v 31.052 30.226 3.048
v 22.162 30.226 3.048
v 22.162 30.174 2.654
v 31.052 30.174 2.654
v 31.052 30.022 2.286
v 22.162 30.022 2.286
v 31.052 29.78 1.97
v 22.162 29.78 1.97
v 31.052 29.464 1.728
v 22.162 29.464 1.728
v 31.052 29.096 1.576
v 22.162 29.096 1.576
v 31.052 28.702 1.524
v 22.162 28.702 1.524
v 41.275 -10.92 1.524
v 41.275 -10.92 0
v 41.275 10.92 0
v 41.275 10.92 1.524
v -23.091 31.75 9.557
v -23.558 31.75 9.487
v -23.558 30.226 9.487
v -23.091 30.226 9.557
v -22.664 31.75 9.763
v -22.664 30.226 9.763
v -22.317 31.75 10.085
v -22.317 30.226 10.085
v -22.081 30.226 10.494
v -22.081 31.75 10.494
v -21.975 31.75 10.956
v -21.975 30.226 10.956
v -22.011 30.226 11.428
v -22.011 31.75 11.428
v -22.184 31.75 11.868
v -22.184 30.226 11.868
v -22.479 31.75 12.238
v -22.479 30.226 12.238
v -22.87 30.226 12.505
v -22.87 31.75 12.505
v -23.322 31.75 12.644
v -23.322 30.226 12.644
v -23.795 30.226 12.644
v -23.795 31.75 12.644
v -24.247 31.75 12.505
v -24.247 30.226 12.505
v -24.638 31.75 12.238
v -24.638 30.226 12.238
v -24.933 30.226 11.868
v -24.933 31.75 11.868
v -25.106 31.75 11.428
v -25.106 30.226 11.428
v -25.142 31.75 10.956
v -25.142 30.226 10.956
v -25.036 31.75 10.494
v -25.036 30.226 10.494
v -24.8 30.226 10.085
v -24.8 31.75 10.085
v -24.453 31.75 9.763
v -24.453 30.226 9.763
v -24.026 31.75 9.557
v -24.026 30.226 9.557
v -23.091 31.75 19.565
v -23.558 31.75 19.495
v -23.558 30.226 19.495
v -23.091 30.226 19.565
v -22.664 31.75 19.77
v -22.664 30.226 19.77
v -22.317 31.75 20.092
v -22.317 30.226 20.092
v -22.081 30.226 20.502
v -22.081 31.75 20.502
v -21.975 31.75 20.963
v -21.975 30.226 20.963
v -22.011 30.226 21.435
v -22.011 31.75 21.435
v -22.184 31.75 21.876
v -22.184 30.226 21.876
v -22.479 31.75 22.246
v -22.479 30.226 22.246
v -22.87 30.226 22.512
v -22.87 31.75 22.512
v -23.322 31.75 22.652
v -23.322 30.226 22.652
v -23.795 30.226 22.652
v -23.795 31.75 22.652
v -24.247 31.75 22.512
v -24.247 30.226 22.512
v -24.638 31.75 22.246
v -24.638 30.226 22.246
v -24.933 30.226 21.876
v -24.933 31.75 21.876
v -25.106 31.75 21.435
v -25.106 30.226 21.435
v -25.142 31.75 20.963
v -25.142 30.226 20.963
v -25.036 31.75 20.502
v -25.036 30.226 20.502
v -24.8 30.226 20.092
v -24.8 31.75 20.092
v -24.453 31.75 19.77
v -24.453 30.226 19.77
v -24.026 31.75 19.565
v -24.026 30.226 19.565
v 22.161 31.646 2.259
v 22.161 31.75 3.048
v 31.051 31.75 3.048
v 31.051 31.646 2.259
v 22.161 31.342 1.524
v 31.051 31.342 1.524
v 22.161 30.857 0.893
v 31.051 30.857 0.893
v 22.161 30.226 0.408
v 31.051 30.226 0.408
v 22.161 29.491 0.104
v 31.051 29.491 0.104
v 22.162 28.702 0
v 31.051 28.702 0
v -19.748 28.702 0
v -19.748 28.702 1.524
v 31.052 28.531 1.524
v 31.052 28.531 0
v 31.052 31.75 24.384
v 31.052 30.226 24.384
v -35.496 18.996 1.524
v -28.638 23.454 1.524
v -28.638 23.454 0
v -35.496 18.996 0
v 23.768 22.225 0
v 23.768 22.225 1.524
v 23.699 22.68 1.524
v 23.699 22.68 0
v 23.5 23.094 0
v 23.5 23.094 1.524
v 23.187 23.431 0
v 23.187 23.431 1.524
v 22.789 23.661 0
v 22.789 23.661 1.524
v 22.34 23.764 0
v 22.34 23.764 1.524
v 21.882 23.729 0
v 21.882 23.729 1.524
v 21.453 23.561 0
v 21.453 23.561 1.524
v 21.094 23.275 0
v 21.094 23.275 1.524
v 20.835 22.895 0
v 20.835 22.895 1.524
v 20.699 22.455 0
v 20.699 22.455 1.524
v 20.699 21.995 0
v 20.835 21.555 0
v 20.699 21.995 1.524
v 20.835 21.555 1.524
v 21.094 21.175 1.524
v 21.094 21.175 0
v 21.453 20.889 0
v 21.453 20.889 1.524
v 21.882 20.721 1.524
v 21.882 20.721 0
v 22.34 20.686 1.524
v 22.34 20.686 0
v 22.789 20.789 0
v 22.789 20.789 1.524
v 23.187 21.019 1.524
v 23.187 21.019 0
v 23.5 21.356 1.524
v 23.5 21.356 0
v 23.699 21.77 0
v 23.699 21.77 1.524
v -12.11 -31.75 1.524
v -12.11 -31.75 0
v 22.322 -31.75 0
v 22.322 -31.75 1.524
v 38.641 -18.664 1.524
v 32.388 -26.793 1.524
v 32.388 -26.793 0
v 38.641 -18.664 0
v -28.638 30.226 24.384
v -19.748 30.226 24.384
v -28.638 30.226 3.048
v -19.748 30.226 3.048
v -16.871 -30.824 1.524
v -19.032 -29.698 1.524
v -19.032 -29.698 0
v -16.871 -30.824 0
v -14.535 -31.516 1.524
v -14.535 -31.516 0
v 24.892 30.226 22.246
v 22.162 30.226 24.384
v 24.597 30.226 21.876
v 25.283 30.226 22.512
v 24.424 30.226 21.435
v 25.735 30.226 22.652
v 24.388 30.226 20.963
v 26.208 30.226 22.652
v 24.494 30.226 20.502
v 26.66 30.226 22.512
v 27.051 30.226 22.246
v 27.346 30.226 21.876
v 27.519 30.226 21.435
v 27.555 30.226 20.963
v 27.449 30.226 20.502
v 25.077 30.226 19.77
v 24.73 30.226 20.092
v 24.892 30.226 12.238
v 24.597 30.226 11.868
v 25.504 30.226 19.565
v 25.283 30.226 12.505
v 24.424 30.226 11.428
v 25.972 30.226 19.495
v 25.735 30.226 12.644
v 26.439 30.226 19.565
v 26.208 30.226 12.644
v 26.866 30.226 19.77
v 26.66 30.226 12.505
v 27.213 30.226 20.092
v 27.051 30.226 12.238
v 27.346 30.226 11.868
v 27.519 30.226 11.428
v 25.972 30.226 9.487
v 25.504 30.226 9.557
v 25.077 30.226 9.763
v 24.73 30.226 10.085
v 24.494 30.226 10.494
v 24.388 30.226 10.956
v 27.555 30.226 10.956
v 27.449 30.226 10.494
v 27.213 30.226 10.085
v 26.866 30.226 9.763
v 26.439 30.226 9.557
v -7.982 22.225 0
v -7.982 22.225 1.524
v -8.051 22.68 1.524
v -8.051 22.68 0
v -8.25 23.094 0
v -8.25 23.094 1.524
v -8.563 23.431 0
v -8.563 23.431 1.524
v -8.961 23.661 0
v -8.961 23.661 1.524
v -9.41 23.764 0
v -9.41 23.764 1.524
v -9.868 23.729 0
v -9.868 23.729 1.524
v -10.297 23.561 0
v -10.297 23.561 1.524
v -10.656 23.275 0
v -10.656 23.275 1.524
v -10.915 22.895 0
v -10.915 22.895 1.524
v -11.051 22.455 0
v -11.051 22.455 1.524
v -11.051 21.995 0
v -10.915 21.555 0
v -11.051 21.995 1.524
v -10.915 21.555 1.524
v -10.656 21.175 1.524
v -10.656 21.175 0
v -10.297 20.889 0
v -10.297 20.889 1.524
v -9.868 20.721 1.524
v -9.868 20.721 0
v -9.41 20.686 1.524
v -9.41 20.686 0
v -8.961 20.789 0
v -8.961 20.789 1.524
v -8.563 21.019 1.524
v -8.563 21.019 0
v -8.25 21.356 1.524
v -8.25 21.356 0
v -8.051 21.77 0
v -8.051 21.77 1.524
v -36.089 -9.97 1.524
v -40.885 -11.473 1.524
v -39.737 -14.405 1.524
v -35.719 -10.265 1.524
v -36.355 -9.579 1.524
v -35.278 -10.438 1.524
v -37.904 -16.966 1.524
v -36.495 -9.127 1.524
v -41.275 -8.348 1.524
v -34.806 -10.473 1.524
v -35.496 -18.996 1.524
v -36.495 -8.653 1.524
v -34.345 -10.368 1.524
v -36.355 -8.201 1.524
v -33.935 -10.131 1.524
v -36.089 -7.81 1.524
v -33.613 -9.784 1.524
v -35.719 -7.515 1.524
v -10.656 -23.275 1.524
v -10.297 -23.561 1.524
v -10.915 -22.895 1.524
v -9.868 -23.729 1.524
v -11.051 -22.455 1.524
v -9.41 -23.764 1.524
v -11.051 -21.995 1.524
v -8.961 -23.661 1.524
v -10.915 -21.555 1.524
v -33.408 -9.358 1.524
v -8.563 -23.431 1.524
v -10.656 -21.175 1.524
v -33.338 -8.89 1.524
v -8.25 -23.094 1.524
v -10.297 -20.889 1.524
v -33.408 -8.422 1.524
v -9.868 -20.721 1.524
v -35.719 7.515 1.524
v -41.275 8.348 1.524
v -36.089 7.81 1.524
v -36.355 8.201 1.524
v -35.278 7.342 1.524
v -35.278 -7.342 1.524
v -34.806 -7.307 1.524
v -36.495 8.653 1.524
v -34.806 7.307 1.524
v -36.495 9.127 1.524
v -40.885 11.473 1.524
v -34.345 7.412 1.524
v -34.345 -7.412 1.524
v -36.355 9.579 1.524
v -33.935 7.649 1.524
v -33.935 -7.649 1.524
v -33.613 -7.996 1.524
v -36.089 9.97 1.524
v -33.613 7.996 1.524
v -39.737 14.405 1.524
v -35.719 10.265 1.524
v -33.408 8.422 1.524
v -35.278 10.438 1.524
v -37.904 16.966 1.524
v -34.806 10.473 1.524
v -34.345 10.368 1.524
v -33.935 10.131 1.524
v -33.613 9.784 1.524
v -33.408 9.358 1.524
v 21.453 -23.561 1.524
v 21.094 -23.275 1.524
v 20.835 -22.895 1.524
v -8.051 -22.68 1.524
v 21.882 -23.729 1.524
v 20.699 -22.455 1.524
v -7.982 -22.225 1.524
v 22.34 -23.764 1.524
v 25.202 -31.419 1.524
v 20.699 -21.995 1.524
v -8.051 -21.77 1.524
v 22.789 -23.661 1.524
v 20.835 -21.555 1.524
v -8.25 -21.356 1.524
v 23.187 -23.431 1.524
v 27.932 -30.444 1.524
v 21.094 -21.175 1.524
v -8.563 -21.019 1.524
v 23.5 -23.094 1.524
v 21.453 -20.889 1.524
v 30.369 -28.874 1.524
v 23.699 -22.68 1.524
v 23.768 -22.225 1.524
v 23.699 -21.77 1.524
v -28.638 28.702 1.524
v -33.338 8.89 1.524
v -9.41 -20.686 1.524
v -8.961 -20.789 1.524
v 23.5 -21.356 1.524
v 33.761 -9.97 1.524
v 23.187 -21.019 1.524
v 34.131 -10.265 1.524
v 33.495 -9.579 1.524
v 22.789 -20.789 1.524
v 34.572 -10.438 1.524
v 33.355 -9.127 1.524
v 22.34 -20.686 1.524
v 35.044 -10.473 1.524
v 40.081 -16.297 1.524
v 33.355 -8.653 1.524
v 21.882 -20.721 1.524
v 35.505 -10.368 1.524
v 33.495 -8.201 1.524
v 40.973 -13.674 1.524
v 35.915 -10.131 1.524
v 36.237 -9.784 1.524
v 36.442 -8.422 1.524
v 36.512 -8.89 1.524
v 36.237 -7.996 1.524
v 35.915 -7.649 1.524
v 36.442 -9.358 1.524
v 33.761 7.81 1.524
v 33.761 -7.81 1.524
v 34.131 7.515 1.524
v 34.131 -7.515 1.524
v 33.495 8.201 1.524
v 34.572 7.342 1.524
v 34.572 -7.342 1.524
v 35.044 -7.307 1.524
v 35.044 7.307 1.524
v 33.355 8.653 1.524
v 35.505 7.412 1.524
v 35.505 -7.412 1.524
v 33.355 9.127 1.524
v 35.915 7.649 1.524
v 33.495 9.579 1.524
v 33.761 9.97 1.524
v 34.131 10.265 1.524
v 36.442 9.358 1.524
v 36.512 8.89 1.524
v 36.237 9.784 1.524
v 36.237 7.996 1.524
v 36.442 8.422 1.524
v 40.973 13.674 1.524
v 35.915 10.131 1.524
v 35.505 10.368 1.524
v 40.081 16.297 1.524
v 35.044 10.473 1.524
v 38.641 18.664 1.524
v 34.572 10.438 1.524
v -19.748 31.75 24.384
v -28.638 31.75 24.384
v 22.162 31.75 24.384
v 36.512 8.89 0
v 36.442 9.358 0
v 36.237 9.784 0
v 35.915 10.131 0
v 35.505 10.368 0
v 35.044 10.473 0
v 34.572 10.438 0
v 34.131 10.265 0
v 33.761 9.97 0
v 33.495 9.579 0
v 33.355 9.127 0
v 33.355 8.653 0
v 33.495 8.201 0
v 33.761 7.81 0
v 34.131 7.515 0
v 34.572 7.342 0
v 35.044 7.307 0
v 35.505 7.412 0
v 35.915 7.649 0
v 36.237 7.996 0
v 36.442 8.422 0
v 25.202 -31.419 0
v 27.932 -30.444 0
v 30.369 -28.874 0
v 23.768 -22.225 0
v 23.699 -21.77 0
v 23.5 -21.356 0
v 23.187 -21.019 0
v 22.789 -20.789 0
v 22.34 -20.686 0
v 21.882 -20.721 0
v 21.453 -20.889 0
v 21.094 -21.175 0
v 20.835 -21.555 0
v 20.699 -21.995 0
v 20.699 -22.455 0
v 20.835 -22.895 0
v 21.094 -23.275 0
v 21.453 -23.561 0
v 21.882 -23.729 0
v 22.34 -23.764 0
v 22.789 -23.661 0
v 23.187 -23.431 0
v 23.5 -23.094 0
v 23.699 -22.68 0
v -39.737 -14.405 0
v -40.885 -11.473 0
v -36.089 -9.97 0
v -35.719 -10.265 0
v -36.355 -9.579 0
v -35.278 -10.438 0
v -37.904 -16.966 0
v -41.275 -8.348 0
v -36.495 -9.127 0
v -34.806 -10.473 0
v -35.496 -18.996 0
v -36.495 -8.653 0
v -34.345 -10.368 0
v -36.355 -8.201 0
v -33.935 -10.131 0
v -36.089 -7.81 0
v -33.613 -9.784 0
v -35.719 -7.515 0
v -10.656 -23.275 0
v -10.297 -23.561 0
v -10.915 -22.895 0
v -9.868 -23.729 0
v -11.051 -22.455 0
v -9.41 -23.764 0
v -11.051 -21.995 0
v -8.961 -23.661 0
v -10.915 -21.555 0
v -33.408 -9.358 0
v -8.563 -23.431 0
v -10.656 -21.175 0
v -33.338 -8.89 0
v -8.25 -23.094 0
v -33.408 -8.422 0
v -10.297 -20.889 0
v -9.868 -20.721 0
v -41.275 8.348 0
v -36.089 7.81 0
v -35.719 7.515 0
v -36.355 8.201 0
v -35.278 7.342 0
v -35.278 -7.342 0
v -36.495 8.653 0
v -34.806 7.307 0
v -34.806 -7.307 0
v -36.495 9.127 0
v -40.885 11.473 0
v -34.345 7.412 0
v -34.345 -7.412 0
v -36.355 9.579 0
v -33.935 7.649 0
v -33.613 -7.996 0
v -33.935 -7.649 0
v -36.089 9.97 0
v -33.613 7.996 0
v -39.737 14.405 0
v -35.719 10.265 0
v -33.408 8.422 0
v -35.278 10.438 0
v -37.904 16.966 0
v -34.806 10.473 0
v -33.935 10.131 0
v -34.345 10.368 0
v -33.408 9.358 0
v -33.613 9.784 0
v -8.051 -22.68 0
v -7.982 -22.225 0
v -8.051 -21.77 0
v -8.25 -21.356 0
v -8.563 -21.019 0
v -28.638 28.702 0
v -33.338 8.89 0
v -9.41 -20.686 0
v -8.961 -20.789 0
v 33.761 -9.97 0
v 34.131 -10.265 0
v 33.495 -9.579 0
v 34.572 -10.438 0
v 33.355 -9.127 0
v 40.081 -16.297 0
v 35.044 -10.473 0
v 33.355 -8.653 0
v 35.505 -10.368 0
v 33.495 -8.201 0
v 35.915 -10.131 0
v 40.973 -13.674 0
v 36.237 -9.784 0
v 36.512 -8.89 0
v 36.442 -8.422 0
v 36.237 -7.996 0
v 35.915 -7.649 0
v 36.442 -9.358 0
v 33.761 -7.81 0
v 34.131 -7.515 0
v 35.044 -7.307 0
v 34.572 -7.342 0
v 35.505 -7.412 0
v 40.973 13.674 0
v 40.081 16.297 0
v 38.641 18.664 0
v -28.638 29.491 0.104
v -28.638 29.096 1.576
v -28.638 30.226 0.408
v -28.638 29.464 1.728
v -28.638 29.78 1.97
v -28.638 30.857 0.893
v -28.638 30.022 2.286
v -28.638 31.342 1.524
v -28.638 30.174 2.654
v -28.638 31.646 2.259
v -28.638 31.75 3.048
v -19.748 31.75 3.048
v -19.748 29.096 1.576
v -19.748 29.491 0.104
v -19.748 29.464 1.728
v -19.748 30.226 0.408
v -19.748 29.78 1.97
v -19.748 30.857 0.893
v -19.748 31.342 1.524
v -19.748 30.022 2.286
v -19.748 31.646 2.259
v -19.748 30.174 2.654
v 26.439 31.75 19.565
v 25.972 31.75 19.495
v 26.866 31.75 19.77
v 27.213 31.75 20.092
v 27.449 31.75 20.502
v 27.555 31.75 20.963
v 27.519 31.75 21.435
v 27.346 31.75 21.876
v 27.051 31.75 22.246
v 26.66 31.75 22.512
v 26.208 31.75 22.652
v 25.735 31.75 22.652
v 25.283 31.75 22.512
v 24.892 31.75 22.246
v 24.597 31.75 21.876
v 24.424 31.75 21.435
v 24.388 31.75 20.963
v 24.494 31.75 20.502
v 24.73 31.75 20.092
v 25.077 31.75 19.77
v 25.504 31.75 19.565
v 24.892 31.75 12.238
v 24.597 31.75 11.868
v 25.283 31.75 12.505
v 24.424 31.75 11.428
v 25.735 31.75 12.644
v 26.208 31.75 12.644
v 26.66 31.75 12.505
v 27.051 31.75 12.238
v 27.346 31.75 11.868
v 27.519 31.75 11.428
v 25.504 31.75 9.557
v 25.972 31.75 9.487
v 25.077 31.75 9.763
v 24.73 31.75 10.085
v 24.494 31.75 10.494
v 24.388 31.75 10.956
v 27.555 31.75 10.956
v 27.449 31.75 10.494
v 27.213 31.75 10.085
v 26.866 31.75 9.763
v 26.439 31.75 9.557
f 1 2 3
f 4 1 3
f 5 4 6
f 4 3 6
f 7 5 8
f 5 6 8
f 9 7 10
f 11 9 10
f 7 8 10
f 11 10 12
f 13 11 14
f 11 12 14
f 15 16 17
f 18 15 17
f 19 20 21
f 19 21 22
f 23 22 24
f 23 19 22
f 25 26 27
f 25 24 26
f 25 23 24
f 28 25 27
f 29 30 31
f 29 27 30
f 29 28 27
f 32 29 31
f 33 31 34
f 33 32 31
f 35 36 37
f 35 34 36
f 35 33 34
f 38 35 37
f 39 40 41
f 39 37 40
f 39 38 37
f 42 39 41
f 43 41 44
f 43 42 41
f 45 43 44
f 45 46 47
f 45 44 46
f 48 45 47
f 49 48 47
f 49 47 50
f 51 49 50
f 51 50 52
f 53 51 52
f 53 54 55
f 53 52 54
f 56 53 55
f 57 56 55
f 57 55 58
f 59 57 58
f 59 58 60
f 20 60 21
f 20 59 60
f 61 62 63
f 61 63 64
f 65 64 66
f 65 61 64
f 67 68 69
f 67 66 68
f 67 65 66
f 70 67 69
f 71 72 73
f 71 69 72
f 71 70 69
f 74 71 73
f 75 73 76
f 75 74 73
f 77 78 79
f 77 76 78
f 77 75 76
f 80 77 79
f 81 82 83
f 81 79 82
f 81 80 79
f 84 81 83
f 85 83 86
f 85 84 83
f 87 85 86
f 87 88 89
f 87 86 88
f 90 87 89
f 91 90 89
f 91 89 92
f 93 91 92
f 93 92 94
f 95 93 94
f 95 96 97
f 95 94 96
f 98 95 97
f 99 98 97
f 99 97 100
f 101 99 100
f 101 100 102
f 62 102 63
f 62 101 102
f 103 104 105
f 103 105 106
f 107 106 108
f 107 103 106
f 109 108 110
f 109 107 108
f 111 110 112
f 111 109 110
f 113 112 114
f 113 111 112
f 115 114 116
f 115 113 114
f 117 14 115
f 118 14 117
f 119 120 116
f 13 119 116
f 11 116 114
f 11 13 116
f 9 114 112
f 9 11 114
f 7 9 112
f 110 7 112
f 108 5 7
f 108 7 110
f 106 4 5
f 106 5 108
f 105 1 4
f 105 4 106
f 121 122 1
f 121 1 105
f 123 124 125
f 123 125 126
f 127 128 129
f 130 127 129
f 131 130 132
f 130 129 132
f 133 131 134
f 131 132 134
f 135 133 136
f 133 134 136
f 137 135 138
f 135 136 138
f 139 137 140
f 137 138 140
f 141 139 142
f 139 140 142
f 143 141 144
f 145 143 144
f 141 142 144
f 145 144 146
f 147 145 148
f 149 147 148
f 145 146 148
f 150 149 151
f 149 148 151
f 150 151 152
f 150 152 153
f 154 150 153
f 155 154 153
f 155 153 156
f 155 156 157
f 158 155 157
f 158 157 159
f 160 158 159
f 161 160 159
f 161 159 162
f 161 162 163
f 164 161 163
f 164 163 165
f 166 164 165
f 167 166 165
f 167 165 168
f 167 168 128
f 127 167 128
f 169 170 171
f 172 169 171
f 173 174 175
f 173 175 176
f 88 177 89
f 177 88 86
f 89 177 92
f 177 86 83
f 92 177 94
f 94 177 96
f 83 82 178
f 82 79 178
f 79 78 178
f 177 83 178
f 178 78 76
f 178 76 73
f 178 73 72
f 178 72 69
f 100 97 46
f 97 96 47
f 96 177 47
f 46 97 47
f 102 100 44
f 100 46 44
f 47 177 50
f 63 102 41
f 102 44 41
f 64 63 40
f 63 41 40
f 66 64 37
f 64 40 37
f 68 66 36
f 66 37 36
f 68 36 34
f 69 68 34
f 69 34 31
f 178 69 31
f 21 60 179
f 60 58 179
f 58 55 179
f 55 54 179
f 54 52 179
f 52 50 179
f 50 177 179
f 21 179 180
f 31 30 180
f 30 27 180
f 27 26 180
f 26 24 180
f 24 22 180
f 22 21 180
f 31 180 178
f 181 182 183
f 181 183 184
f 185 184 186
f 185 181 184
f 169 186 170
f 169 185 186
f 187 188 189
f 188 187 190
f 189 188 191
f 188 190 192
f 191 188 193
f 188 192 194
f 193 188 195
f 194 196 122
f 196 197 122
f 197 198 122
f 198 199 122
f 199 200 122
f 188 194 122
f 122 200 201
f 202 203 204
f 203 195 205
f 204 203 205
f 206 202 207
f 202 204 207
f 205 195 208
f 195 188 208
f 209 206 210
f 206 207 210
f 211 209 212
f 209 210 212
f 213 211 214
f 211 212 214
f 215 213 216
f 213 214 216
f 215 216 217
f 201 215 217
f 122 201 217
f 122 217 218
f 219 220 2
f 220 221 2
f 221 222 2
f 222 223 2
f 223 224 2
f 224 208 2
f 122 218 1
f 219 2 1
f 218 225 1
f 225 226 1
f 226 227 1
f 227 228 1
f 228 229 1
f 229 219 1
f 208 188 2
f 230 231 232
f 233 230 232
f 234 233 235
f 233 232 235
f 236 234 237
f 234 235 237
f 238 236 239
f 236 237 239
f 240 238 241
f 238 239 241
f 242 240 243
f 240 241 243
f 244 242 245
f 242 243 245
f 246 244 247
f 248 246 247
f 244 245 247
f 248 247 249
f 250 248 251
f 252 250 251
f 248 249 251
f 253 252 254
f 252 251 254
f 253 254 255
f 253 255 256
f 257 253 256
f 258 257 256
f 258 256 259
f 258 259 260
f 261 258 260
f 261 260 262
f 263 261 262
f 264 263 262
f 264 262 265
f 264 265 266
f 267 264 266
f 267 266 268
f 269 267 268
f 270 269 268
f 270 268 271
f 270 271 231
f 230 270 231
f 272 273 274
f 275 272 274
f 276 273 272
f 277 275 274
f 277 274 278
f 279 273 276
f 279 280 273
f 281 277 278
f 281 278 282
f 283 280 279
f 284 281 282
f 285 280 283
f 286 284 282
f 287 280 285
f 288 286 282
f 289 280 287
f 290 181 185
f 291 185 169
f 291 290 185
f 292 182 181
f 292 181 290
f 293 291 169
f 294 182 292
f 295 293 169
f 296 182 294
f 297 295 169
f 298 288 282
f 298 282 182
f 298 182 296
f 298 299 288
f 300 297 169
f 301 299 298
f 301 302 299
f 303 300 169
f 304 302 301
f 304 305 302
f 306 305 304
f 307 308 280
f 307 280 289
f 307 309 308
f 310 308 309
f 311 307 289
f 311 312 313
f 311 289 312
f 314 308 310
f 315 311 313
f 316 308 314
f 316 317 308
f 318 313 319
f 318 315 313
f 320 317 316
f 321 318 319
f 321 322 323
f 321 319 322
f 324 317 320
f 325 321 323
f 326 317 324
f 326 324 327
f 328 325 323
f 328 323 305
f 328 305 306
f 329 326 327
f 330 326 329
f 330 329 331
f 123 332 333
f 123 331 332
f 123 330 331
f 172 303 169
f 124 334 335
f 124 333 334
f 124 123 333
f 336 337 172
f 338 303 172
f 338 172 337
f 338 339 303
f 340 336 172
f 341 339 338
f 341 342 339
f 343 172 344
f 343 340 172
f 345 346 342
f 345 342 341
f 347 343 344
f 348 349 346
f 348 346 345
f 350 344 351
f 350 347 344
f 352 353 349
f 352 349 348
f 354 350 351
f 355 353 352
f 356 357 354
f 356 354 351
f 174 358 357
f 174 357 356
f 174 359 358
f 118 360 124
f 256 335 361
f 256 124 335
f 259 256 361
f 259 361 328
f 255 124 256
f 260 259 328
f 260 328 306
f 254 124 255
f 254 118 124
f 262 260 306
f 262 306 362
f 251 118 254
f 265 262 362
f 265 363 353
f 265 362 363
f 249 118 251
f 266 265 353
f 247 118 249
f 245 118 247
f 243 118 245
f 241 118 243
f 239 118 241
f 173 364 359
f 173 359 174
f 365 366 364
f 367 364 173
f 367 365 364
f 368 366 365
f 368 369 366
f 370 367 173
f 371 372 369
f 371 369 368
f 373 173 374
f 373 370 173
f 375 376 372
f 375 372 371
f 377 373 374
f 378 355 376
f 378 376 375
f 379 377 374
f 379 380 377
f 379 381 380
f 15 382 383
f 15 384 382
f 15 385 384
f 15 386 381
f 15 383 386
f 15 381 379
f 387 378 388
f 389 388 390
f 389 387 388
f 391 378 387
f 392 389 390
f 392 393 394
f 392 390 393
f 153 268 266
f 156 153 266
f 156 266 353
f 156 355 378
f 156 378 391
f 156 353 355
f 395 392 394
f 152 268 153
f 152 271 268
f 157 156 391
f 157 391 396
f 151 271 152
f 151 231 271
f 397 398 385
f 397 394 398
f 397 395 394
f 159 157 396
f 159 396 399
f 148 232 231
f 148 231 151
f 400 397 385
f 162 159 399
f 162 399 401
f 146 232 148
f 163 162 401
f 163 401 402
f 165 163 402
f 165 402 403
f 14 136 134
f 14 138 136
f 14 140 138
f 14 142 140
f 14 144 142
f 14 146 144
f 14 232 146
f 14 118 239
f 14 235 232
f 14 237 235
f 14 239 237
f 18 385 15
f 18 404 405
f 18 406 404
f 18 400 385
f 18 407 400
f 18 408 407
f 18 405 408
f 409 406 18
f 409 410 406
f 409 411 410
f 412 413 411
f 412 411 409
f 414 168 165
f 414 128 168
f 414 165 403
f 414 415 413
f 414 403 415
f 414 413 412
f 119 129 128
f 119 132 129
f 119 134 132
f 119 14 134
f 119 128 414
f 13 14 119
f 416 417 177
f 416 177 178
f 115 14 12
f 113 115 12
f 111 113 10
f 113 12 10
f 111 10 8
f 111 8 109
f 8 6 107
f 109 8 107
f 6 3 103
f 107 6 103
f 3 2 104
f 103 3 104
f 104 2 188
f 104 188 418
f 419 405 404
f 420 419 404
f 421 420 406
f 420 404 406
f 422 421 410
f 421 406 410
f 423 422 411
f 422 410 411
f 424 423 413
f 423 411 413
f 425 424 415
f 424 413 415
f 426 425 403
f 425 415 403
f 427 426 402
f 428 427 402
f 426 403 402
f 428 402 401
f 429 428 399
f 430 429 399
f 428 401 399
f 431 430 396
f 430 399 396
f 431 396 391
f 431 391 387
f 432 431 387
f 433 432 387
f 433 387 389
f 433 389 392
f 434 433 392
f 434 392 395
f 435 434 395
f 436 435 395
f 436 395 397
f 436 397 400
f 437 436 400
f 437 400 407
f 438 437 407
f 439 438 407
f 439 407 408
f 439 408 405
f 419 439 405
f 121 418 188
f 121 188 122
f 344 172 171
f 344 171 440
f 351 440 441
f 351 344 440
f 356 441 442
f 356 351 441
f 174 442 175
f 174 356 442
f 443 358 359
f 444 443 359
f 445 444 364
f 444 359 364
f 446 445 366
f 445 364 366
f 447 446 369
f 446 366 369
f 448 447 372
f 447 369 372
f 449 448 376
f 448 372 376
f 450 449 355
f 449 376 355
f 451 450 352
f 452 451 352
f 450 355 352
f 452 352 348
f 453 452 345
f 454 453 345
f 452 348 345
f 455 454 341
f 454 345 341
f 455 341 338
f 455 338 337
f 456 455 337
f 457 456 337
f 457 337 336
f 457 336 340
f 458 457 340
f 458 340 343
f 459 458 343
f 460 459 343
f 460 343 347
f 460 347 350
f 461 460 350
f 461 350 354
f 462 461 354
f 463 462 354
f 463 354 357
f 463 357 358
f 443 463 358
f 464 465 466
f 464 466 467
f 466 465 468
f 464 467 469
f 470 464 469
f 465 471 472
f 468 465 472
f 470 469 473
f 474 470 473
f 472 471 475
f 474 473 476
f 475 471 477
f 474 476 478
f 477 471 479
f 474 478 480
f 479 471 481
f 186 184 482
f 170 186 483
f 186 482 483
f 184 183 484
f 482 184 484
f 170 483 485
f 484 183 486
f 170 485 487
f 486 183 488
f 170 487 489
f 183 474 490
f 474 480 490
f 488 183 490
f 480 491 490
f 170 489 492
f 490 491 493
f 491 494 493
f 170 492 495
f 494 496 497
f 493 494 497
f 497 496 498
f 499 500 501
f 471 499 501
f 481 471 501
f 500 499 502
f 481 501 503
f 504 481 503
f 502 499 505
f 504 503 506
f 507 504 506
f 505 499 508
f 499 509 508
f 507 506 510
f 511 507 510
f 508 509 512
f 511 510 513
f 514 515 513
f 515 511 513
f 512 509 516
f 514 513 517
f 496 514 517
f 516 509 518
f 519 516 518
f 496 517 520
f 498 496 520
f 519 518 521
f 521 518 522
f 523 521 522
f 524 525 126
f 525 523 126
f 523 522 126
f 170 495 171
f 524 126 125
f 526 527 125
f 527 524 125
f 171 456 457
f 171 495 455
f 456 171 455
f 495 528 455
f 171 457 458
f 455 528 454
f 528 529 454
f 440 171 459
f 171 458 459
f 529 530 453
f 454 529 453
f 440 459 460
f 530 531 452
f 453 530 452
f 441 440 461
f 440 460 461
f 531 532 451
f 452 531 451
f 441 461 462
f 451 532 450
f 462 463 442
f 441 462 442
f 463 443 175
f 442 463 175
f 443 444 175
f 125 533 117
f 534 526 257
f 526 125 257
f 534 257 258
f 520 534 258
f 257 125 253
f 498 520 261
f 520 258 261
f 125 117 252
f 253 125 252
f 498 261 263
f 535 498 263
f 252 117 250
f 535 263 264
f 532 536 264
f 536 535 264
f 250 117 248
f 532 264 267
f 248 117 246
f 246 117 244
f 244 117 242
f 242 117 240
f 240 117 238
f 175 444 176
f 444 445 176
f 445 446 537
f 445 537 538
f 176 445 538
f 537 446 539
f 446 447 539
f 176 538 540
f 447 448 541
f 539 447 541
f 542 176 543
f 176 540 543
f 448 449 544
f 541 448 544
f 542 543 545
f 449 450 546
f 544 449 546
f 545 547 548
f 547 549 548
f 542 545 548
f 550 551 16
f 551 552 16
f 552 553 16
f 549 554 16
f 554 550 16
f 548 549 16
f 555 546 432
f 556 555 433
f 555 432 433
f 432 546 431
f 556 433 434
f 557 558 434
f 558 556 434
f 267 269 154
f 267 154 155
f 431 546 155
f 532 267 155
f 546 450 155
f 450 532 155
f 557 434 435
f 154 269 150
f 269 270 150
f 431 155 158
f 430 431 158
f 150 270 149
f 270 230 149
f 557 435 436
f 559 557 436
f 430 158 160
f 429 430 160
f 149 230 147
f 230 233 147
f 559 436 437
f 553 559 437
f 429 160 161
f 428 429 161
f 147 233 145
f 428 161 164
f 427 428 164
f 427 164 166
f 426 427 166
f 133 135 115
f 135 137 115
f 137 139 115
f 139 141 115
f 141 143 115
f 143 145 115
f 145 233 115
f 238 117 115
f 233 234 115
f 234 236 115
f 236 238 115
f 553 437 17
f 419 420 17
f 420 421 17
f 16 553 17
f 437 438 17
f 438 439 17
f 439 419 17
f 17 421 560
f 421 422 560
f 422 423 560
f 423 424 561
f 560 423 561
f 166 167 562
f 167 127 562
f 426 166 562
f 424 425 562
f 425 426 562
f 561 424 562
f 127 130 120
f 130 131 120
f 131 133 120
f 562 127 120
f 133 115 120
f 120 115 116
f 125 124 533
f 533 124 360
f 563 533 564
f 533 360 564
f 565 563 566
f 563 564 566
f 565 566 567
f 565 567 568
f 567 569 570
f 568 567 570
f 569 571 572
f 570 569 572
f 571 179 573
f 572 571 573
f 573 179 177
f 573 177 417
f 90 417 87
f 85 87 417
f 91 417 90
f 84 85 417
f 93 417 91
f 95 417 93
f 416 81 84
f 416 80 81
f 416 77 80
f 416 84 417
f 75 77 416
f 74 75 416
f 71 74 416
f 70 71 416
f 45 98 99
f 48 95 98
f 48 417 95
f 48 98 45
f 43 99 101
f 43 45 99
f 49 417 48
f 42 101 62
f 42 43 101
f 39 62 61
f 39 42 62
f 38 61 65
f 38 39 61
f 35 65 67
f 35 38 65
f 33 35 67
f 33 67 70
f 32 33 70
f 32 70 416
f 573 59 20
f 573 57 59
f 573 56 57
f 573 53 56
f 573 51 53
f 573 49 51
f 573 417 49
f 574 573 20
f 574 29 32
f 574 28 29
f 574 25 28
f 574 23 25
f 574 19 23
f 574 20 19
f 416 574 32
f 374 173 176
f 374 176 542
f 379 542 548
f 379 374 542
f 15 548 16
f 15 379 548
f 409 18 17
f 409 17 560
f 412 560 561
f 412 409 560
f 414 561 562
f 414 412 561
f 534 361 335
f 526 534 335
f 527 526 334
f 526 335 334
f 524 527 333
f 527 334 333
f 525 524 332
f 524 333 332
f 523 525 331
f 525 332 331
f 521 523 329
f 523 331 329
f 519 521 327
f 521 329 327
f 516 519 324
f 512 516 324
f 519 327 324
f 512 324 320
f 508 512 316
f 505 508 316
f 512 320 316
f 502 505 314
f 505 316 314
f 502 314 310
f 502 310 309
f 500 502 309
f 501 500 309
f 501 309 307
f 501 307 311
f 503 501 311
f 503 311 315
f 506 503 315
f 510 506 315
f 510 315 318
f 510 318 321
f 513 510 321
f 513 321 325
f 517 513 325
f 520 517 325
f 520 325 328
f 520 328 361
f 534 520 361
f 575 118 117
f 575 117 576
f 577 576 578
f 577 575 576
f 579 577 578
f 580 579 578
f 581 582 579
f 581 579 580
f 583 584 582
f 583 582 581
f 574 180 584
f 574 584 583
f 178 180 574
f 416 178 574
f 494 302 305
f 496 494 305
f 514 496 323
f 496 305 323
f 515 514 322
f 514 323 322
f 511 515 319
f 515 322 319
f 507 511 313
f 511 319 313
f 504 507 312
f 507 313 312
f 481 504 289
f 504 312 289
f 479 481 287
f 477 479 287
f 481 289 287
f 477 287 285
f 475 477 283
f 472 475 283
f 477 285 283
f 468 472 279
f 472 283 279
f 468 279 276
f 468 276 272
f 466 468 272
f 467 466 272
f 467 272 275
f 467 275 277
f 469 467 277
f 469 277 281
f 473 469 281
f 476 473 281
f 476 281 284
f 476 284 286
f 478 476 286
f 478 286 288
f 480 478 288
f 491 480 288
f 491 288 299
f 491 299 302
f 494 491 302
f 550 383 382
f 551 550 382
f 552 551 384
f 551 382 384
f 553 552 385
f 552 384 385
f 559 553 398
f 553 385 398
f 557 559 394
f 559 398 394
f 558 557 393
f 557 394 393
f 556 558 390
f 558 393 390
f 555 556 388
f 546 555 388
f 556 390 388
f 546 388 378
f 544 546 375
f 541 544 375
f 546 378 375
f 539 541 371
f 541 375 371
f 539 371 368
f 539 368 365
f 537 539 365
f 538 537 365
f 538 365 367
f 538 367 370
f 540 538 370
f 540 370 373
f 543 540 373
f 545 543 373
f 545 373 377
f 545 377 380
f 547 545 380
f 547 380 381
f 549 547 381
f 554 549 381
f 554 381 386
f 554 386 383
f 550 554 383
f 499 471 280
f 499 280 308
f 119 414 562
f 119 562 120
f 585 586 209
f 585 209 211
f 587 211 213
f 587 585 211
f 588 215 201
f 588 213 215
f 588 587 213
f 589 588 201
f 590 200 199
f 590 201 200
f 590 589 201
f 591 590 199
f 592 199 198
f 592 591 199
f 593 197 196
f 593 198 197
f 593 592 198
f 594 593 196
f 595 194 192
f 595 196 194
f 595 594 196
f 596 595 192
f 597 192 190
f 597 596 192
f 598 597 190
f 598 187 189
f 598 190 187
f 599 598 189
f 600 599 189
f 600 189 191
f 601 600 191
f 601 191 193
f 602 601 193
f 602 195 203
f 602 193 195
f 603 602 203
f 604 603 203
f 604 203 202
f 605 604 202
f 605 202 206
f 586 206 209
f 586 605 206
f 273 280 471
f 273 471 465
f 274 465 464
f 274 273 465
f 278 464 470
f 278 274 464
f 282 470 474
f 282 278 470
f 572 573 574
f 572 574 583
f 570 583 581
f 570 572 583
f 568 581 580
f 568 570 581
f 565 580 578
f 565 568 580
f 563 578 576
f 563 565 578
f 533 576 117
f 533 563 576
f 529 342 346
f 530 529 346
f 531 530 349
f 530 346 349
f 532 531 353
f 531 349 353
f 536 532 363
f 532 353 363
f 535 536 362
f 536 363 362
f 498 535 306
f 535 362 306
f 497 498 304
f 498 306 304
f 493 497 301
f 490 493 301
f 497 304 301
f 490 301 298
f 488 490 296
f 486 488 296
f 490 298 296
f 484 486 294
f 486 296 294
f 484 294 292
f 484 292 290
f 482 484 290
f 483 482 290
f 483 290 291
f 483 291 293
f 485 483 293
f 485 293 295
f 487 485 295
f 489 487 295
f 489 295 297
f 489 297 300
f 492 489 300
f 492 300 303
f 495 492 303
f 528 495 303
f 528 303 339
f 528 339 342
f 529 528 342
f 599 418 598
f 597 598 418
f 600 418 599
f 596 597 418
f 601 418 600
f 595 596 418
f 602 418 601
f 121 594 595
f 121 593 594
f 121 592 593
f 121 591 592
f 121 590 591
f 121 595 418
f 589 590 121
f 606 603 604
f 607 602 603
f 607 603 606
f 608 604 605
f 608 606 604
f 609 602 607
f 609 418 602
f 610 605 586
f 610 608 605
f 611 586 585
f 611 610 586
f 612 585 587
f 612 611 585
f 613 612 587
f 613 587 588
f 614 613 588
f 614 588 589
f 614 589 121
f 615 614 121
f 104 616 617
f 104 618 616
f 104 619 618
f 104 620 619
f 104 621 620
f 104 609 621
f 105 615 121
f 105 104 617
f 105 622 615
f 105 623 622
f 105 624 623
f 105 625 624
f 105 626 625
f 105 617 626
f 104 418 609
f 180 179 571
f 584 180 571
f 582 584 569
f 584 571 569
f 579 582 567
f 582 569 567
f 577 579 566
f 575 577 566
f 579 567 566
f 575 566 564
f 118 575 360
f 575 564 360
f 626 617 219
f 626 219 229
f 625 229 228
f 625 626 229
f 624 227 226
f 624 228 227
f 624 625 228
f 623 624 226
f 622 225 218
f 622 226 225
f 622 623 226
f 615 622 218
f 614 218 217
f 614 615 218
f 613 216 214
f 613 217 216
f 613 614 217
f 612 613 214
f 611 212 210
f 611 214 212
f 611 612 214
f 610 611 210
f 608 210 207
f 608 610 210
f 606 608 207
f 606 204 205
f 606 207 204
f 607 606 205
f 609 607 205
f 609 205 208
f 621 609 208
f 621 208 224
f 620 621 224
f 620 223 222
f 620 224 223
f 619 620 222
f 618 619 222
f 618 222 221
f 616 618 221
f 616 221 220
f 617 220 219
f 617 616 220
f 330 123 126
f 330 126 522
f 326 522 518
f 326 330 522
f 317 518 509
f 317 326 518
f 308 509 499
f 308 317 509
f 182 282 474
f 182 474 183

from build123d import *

# Parameters (mm, degrees)
SKETCH1_W               = 82.55
SKETCH1_H               = 63.5
BOSS_EXTRUDE1_DEPTH     = 1.524
SKETCH2_OUTSIDE_W       = 105.382
SKETCH2_OUTSIDE_H       = 86.332
SKETCH2_OUTSIDE_R       = 1.54305
SKETCH2_OUTSIDE_R_2     = 1.5875
CUT_EXTRUDE1_DEPTH      = 53.096167815
SKETCH3_W               = 8.89
SKETCH3_H               = 1.524
BOSS_EXTRUDE2_DEPTH     = 22.86
CONVERT_SOLID2_START    = -28.6385
CONVERT_SOLID2_DEPTH    = 59.69
CONVERT_SOLID2_2_DEPTH  = 8.89
CONVERT_SOLID2_START_2  = 22.1615
CONVERT_SOLID2_3_DEPTH  = 8.89
CUT_EXTRUDE2_DEPTH      = 79.353236417
CUT_EXTRUDE2_DEPTH_BACK = 79.353236417
SKETCH12_R              = 1.5875


# Read off the part's stored shape, not the designer's step: Convert-Solid2
with BuildPart() as part:
    # Sketch1 → Boss-Extrude1 (new body)
    with BuildSketch(Plane.XY):
        Rectangle(SKETCH1_W, SKETCH1_H)
    extrude(amount=BOSS_EXTRUDE1_DEPTH)

    # Sketch2 outside → Cut-Extrude1 (cut, through all)
    # profile 1 of 9: a face of its own
    with BuildSketch(Plane.XY.offset(1.524)):
        Rectangle(SKETCH2_OUTSIDE_W, SKETCH2_OUTSIDE_H)
        with BuildLine():
            Line((-41.275, 8.347887239), (-41.275, -8.347887239))
            ThreePointArc((-41.275, -8.347887239), (-39.737239271, -14.405478713), (-35.496352053, -18.996121166))
            Line((-35.496352053, -18.996121166), (-19.031563189, -29.698233927))
            ThreePointArc((-19.031563189, -29.698233927), (-15.719742209, -31.22625909), (-12.110211137, -31.75))
            Line((-12.110211137, -31.75), (22.321500982, -31.75))
            ThreePointArc((22.321500982, -31.75), (27.931748365, -30.443644031), (32.387825644, -26.793326663))
            Line((32.387825644, -26.793326663), (38.641324662, -18.66377794))
            ThreePointArc((38.641324662, -18.66377794), (40.598566925, -15.009930266), (41.275, -10.920451277))
            Line((41.275, -10.920451277), (41.275, 10.920451277))
            ThreePointArc((41.275, 10.920451277), (40.598566925, 15.009930266), (38.641324662, 18.66377794))
            Line((38.641324662, 18.66377794), (31.0515, 28.53055))
            Line((31.0515, 28.53055), (31.0515, 31.75))
            Line((31.0515, 31.75), (22.1615, 31.75))
            Line((22.1615, 31.75), (22.1615, 28.702))
            Line((22.1615, 28.702), (-19.7485, 28.702))
            Line((-19.7485, 28.702), (-19.7485, 31.75))
            Line((-19.7485, 31.75), (-28.6385, 31.75))
            Line((-28.6385, 31.75), (-28.6385, 23.453725))
            Line((-28.6385, 23.453725), (-35.496352053, 18.996121166))
            ThreePointArc((-35.496352053, 18.996121166), (-39.737239271, 14.405478713), (-41.275, 8.347887239))
        make_face(mode=Mode.SUBTRACT)
    # profile 2 of 9: a face of its own
    with BuildSketch(Plane.XY.offset(1.524)):
        with Locations((-9.525, 22.225)):
            Circle(SKETCH2_OUTSIDE_R)
    # profile 3 of 9: a face of its own
    with BuildSketch(Plane.XY.offset(1.524)):
        with Locations((22.225, 22.225)):
            Circle(SKETCH2_OUTSIDE_R)
    # profile 4 of 9: a face of its own
    with BuildSketch(Plane.XY.offset(1.524)):
        with Locations((22.225, -22.225)):
            Circle(SKETCH2_OUTSIDE_R)
    # profile 5 of 9: a face of its own
    with BuildSketch(Plane.XY.offset(1.524)):
        with Locations((-9.525, -22.225)):
            Circle(SKETCH2_OUTSIDE_R)
    # profile 6 of 9: a face of its own
    with BuildSketch(Plane.XY.offset(1.524)):
        with Locations((34.925, -8.89)):
            Circle(SKETCH2_OUTSIDE_R_2)
    # profile 7 of 9: a face of its own
    with BuildSketch(Plane.XY.offset(1.524)):
        with Locations((34.925, 8.89)):
            Circle(SKETCH2_OUTSIDE_R_2)
    # profile 8 of 9: a face of its own
    with BuildSketch(Plane.XY.offset(1.524)):
        with Locations((-34.925, -8.89)):
            Circle(SKETCH2_OUTSIDE_R_2)
    # profile 9 of 9: a face of its own
    with BuildSketch(Plane.XY.offset(1.524)):
        with Locations((-34.925, 8.89)):
            Circle(SKETCH2_OUTSIDE_R_2)
    extrude(amount=-CUT_EXTRUDE1_DEPTH, mode=Mode.SUBTRACT)

    # Sketch3 → Boss-Extrude2 (add)
    with BuildSketch(Plane.XY.offset(1.524)):
        with Locations((-24.1935, 30.988)):
            Rectangle(SKETCH3_W, SKETCH3_H)
        with Locations((26.6065, 30.988)):
            Rectangle(SKETCH3_W, SKETCH3_H)
    extrude(amount=BOSS_EXTRUDE2_DEPTH)

    # Convert-Solid2 outline → Convert-Solid2 (cut)
    with BuildSketch(Plane.YZ.offset(CONVERT_SOLID2_START)):
        with BuildLine():
            ThreePointArc((31.75, 3.048), (30.857261469, 0.892738531), (28.702, 0))
            Line((28.702, 0), (31.75, 0))
            Line((31.75, 0), (31.75, 3.048))
        make_face()
    extrude(amount=CONVERT_SOLID2_DEPTH, mode=Mode.SUBTRACT)

    # Convert-Solid2 2 outline → Convert-Solid2 2 (add)
    with BuildSketch(Plane.YZ.offset(CONVERT_SOLID2_START)):
        with BuildLine():
            ThreePointArc((30.226, 3.048), (29.779630735, 1.970369265), (28.702, 1.524))
            Line((28.702, 1.524), (30.226, 1.524))
            Line((30.226, 1.524), (30.226, 3.048))
        make_face()
    extrude(amount=CONVERT_SOLID2_2_DEPTH)

    # Convert-Solid2 3 outline → Convert-Solid2 3 (add)
    with BuildSketch(Plane.YZ.offset(CONVERT_SOLID2_START_2)):
        with BuildLine():
            ThreePointArc((30.226, 3.048), (29.779630735, 1.970369265), (28.702, 1.524))
            Line((28.702, 1.524), (30.226, 1.524))
            Line((30.226, 1.524), (30.226, 3.048))
        make_face()
    extrude(amount=CONVERT_SOLID2_3_DEPTH)

    # Sketch12 → Cut-Extrude2 (cut, two sides: drawn at the far end of the back side and taken through both)
    with BuildSketch(Plane.XZ.offset(-30.226).offset(-CUT_EXTRUDE2_DEPTH_BACK)):
        with Locations(Location((-23.5585, 21.082, 0), (0, 0, 270))):
            Circle(SKETCH12_R)
        with Locations(Location((-23.5585, 11.0744, 0), (0, 0, 270))):
            Circle(SKETCH12_R)
        with Locations(Location((25.9715, 21.082, 0), (0, 0, 270))):
            Circle(SKETCH12_R)
        with Locations(Location((25.9715, 11.0744, 0), (0, 0, 270))):
            Circle(SKETCH12_R)
    extrude(amount=CUT_EXTRUDE2_DEPTH + CUT_EXTRUDE2_DEPTH_BACK, mode=Mode.SUBTRACT)


solid = part.part
